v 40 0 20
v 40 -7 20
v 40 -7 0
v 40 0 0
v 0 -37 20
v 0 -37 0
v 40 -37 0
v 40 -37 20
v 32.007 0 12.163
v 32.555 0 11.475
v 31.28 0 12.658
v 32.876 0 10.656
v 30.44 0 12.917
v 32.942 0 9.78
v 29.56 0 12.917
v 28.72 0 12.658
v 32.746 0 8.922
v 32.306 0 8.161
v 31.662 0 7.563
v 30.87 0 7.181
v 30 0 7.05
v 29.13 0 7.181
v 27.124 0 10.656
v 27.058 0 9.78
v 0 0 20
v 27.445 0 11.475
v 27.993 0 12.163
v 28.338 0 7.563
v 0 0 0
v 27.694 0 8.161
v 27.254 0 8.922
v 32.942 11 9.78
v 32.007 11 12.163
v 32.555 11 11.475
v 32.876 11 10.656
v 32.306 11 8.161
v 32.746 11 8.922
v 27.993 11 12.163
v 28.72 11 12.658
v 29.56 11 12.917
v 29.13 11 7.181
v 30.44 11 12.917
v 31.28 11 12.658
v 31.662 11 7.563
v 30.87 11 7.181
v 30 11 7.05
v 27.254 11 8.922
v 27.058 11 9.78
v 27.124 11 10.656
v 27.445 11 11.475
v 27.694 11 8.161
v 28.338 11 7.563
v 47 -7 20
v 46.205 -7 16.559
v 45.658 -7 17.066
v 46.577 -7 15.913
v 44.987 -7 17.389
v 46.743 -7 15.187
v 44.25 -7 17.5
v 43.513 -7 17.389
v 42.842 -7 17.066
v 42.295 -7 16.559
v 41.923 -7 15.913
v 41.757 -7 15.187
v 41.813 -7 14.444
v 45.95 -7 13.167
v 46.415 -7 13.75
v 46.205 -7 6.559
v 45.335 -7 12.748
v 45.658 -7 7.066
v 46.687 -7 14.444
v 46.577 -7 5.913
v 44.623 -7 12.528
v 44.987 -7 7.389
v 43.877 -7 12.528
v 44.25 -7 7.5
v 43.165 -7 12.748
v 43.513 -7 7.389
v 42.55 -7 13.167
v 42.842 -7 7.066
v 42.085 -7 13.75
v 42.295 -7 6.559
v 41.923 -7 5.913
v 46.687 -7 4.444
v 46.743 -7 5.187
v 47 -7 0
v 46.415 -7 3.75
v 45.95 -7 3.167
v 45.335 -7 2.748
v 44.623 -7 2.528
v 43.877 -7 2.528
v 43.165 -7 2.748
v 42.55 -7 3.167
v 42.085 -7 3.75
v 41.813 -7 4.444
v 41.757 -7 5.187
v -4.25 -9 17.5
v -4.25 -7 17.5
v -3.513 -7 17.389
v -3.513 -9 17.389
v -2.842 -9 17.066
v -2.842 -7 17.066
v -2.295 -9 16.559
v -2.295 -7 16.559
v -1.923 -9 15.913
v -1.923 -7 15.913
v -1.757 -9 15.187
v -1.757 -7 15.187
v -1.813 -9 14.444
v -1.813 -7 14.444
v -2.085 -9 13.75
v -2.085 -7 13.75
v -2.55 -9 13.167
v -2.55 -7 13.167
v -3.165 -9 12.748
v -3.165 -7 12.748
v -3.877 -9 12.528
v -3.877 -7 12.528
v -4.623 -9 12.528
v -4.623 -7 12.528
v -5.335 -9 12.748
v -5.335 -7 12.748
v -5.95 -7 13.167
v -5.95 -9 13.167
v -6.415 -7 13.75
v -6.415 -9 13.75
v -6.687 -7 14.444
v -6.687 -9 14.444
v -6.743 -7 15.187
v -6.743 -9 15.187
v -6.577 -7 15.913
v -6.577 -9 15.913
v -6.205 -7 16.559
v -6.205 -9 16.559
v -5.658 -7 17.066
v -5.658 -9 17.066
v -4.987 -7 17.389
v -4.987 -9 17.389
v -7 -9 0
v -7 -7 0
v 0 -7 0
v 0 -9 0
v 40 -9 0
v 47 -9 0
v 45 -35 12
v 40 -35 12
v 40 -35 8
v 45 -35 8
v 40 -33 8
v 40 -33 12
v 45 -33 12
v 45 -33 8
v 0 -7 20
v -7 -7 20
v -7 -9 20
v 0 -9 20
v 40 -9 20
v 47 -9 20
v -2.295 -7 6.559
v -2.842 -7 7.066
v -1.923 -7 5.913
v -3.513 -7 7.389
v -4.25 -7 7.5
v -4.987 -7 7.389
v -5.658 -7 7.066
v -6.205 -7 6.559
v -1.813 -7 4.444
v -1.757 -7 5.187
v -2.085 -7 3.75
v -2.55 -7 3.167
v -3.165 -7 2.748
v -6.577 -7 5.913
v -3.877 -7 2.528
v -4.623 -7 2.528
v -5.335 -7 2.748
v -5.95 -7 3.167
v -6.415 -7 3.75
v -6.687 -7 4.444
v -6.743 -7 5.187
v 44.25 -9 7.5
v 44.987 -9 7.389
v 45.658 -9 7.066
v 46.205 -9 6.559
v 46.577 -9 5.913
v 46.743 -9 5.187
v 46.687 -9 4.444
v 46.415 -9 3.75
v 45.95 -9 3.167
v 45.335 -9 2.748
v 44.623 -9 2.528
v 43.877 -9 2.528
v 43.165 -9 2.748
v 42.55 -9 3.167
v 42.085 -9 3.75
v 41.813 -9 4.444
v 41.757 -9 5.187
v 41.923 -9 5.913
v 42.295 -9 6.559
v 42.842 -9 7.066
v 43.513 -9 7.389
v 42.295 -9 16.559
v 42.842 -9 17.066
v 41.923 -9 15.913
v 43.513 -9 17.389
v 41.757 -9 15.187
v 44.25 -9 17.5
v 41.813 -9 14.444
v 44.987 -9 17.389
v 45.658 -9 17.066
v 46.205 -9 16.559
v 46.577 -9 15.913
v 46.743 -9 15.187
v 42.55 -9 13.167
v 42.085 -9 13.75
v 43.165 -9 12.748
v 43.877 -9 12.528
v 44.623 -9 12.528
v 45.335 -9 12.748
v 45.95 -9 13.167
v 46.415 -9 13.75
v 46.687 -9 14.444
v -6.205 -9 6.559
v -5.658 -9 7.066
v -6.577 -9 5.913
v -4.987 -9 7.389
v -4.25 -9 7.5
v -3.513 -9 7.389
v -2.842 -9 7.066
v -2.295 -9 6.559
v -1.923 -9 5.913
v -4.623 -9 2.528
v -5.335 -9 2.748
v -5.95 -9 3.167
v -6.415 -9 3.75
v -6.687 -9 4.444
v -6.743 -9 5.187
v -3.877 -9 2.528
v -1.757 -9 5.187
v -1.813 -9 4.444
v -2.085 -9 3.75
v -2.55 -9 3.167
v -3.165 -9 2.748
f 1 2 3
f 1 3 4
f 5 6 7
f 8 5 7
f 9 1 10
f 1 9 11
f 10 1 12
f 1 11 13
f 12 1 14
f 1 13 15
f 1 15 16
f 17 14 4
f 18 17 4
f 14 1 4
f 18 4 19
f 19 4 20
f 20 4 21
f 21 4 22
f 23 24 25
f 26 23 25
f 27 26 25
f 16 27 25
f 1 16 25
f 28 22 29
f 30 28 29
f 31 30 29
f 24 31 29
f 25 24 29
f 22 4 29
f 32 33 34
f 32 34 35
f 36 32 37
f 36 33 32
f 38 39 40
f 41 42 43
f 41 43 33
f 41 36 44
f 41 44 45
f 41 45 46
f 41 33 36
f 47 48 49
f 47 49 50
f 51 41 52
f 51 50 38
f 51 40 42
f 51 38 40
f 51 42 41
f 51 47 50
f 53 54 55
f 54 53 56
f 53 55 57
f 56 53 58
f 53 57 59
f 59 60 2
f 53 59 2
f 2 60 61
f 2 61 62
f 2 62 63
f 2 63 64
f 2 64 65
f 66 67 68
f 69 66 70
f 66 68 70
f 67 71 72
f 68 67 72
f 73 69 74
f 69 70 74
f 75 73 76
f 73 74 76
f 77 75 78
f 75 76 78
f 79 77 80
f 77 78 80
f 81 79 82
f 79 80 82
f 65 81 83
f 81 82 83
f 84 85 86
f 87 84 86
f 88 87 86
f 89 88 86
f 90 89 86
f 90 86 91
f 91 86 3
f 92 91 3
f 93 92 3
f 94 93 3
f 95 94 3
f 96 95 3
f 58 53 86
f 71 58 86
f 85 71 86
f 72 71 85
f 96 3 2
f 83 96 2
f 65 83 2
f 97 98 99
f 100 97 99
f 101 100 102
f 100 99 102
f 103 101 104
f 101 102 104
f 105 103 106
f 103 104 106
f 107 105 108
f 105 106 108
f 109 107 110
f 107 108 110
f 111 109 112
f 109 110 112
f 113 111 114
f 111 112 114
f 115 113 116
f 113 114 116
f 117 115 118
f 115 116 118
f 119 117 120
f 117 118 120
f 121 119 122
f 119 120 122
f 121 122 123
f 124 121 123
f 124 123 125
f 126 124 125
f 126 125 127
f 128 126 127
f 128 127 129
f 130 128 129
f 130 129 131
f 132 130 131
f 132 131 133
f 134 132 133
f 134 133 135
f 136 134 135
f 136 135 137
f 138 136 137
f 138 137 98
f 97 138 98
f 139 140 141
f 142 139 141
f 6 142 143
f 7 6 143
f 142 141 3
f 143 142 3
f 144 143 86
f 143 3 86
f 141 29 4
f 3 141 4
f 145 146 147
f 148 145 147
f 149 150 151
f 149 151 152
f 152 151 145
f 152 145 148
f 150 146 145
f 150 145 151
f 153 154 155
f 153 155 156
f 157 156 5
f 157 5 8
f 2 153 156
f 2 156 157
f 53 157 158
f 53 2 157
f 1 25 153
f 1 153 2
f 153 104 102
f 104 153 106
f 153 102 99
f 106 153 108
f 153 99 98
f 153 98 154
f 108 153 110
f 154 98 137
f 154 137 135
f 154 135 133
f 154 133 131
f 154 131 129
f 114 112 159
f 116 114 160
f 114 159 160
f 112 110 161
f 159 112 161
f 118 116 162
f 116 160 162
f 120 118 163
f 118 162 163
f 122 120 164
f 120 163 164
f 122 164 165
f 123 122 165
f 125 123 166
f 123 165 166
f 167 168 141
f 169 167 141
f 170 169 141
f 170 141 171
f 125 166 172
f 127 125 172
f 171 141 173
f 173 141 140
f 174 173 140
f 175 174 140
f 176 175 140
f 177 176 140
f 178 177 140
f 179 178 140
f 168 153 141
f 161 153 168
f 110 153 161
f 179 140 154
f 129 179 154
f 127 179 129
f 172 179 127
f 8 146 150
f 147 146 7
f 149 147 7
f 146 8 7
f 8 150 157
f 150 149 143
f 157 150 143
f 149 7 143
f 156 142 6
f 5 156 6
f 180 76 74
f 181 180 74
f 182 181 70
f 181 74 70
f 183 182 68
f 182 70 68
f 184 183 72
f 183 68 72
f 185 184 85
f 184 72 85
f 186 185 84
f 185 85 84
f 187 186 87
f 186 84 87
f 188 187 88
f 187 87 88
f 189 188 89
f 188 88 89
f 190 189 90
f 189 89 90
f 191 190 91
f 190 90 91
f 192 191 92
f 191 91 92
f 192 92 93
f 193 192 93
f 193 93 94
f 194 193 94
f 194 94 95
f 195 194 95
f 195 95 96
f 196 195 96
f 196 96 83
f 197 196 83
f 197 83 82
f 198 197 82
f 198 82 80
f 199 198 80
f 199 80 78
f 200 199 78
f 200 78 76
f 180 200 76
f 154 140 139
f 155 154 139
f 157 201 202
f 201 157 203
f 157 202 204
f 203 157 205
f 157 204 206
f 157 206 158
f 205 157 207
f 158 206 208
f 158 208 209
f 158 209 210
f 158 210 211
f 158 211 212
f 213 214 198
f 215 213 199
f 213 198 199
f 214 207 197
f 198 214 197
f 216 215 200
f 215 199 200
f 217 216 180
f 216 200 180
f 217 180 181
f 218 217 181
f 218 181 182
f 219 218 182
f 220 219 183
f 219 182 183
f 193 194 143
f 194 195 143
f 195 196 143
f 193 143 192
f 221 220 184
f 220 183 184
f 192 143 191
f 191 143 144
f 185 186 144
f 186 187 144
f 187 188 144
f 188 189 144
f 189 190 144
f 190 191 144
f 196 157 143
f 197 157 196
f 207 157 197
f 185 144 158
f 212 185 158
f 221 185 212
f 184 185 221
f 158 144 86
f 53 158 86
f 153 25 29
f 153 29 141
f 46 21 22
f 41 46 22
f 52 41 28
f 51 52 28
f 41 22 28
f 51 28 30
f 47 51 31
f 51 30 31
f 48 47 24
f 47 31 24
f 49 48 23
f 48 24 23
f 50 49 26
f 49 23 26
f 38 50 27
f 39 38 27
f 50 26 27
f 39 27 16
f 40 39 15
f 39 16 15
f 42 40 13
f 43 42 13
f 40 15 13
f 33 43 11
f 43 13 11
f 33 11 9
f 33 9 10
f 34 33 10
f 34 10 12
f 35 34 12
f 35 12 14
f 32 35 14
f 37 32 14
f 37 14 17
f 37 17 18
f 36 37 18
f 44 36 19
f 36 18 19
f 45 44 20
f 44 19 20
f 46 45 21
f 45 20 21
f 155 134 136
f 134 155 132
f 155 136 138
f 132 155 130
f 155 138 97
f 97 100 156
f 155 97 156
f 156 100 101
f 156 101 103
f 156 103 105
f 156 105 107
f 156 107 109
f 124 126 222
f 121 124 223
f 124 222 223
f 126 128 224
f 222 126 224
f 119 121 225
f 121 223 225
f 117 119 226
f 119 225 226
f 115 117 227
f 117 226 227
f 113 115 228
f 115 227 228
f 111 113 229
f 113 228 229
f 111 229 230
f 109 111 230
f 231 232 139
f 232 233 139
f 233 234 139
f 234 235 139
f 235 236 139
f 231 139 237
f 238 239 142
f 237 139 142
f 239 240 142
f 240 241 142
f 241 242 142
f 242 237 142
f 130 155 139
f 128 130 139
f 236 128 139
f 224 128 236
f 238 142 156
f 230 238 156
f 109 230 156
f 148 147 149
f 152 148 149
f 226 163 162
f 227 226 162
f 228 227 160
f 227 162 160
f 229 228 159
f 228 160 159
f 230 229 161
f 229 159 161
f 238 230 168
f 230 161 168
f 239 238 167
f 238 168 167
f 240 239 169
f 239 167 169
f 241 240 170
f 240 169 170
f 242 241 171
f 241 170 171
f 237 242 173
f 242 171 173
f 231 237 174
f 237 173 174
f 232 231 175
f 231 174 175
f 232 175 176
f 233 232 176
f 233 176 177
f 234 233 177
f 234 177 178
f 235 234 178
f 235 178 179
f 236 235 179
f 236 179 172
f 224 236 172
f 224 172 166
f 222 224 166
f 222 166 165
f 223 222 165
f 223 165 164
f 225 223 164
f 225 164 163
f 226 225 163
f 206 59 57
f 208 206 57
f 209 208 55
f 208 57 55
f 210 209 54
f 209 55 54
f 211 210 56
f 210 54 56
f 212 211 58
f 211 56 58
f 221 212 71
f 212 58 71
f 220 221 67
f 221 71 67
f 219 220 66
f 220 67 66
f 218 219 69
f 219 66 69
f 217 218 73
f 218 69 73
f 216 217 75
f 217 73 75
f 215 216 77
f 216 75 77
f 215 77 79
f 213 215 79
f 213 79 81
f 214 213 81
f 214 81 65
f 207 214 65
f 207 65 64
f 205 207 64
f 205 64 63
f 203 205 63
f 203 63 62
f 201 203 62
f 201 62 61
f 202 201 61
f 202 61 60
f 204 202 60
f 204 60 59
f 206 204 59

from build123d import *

# Parameters (mm, degrees)
BOSS_EXTRUDE1_DEPTH = 20
SKETCH2_R           = 2.95
BOSS_EXTRUDE2_DEPTH = 11
SKETCH4_R           = 2.5
CUT_EXTRUDE1_DEPTH  = 3
SKETCH5_W           = 4
SKETCH5_H           = 2
BOSS_EXTRUDE3_DEPTH = 5


with BuildPart() as part:
    # Sketch1 → Boss-Extrude1 (new body)
    with BuildSketch(Plane.XY):
        Polygon((0, -9), (0, -37), (40, -37), (40, -9), (47, -9), (47, -7), (40, -7), (40, 0), (0, 0), (0, -7), (-7, -7), (-7, -9), align=None)
    extrude(amount=BOSS_EXTRUDE1_DEPTH)

    # Sketch2 → Boss-Extrude2 (add)
    with BuildSketch(Plane(origin=(0, 0, 0), x_dir=(1, 0, 0), z_dir=(0, 1, 0))):
        with Locations(Location((30, -10, 0), (0, 0, 90))):
            Circle(SKETCH2_R)
    extrude(amount=BOSS_EXTRUDE2_DEPTH)

    # Sketch4 → Cut-Extrude1 (cut)
    with BuildSketch(Plane(origin=(0, -7, 0), x_dir=(1, 0, 0), z_dir=(0, 1, 0))):
        with Locations(Location((-4.25, -5, 0), (0, 0, 270))):
            Circle(SKETCH4_R)
        with Locations(Location((-4.25, -15, 0), (0, 0, 270))):
            Circle(SKETCH4_R)
        with Locations(Location((44.25, -5, 0), (0, 0, 270))):
            Circle(SKETCH4_R)
        with Locations(Location((44.25, -15, 0), (0, 0, 270))):
            Circle(SKETCH4_R)
    extrude(amount=-CUT_EXTRUDE1_DEPTH, mode=Mode.SUBTRACT)

    # Sketch5 → Boss-Extrude3 (add)
    with BuildSketch(Plane(origin=(40, 0, 0), x_dir=(0, 0, -1), z_dir=(1, 0, 0))):
        with Locations((-10, -34)):
            Rectangle(SKETCH5_W, SKETCH5_H)
    extrude(amount=BOSS_EXTRUDE3_DEPTH)


solid = part.part
